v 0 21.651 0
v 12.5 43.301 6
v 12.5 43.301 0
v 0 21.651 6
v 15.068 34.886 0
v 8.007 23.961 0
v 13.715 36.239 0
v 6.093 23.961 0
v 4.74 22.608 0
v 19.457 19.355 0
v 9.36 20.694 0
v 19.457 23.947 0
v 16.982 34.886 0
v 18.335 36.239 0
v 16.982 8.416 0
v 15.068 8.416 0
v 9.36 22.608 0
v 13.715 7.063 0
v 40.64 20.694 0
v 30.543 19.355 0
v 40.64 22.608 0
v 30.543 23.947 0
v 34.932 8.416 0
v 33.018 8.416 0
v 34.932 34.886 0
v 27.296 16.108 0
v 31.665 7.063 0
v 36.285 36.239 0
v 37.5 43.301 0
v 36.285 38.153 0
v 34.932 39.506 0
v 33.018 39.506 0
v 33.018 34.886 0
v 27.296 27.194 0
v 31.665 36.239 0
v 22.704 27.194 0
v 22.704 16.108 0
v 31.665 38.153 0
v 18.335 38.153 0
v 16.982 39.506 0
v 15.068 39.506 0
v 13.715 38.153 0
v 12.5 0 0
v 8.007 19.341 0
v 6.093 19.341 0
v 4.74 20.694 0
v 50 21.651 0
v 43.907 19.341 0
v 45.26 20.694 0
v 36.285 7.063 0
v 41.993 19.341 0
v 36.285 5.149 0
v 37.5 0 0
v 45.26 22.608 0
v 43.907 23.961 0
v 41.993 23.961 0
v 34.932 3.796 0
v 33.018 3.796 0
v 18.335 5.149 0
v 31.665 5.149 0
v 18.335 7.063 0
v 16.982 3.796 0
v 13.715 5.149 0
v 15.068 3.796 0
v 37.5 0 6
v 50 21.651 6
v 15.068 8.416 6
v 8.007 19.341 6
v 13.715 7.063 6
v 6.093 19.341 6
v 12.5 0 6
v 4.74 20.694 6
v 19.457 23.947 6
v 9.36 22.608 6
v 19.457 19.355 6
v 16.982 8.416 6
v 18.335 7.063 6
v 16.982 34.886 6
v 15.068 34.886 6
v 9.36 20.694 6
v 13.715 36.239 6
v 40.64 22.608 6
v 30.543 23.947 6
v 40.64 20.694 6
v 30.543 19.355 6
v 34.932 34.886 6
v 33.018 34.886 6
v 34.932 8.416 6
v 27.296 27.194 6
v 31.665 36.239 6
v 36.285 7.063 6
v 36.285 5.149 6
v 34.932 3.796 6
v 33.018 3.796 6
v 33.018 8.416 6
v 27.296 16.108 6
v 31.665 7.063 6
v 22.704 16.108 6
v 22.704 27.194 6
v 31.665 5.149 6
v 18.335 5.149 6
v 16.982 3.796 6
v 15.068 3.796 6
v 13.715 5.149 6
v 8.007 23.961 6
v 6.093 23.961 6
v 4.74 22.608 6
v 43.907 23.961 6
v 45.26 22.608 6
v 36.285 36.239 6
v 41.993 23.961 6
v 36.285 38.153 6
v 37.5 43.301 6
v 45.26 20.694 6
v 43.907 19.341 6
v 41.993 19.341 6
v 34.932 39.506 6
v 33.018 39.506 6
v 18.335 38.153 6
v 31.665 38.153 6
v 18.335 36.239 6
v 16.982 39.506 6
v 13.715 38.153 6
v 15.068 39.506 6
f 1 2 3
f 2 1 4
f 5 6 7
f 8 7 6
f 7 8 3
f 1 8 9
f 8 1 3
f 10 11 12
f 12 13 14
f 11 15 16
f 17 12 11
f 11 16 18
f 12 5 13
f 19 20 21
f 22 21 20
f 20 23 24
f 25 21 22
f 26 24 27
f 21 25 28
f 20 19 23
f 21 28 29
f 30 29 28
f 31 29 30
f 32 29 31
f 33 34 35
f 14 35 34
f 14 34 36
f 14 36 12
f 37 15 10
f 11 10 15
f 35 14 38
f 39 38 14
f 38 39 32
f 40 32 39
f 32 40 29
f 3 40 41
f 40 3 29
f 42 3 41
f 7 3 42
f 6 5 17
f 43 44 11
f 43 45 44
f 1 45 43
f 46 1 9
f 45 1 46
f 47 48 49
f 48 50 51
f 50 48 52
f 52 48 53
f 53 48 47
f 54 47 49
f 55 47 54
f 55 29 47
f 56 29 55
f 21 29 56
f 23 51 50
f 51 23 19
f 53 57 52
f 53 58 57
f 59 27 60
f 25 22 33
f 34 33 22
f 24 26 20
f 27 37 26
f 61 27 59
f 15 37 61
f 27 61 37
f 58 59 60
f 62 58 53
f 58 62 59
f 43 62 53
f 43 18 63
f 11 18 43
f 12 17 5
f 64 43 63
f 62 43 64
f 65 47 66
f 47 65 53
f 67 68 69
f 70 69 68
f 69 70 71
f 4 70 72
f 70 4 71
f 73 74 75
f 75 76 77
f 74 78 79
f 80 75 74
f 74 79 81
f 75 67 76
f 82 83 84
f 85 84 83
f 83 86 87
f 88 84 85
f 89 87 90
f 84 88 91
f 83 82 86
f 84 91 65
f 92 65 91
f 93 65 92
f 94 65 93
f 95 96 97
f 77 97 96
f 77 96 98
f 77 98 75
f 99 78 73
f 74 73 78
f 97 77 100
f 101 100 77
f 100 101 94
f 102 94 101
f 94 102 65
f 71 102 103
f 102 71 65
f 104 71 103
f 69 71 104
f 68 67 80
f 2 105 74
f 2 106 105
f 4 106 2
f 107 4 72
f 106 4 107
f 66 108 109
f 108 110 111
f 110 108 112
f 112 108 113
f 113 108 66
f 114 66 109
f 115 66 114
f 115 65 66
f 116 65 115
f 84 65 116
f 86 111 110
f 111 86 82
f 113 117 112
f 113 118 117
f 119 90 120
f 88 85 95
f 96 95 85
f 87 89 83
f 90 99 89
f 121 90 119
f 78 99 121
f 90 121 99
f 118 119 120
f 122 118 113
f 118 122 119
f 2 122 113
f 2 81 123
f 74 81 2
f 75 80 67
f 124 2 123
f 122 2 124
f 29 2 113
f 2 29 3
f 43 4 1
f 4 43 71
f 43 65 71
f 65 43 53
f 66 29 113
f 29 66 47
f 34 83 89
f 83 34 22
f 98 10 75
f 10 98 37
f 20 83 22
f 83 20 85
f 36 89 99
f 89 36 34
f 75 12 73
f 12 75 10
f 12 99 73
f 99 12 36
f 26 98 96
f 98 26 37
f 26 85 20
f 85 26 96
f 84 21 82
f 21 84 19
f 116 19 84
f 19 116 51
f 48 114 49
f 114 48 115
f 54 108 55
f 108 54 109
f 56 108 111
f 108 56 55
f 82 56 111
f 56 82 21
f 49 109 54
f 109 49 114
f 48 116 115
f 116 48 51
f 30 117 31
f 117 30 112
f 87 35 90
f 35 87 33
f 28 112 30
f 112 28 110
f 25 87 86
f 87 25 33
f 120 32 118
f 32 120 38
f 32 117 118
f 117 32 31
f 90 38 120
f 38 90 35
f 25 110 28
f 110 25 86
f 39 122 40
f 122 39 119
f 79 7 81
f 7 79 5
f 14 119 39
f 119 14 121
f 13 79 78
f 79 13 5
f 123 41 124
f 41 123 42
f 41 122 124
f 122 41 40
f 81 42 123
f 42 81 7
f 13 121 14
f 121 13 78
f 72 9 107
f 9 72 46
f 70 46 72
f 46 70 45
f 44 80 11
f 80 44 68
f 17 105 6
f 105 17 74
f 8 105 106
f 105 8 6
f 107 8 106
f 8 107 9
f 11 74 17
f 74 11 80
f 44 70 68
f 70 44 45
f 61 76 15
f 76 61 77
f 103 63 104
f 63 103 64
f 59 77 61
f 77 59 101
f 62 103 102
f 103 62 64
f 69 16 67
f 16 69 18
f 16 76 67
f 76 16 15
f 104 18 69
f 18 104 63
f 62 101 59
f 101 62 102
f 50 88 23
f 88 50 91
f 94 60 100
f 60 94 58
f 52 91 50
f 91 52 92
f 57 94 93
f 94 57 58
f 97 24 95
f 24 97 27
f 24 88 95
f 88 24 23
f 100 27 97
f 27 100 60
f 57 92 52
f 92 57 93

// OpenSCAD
$fn = 32;

// ----------------------------------------------------------------------
// Polygon plate: 6-gon R25, 6 bolt windows
// ----------------------------------------------------------------------

// --- parameters (mm) ---
sides = 6;                // number of polygon sides
plate_r = 25;             // circumscribed radius of the polygon
bore_r = 6;               // centre bore radius
bolts = 6;                // number of bolt windows
ring_r = 17.95;           // bolt-circle radius
bolt_r = 2.5;             // bolt window radius
plate_t = 6;              // plate thickness, Z (extrusion height)

plate_d = 2 * plate_r;  // circumscribed diameter
bore_d = 2 * bore_r;  // centre bore diameter
bolt_d = 2 * bolt_r;  // bolt window diameter
ring_d = 2 * ring_r;  // bolt-circle diameter

profile = [[50, 21.651], [37.5, 43.301], [12.5, 43.301], [0, 21.651], [12.5, 0], [37.5, 0]];  // primary outline, 6 points, counter clockwise
void_1 = [[30.543, 23.947], [27.296, 27.194], [22.704, 27.194], [19.457, 23.947], [19.457, 19.355], [22.704, 16.108], [27.296, 16.108], [30.543, 19.355]];  // centre bore, 8 points
void_2 = [[45.26, 22.608], [43.907, 23.961], [41.993, 23.961], [40.64, 22.608], [40.64, 20.694], [41.993, 19.341], [43.907, 19.341], [45.26, 20.694]];  // bolt window 1, 8 points
void_3 = [[36.285, 38.153], [34.932, 39.506], [33.018, 39.506], [31.665, 38.153], [31.665, 36.239], [33.018, 34.886], [34.932, 34.886], [36.285, 36.239]];  // bolt window 2, 8 points
void_4 = [[18.335, 38.153], [16.982, 39.506], [15.068, 39.506], [13.715, 38.153], [13.715, 36.239], [15.068, 34.886], [16.982, 34.886], [18.335, 36.239]];  // bolt window 3, 8 points
void_5 = [[9.36, 22.608], [8.007, 23.961], [6.093, 23.961], [4.74, 22.608], [4.74, 20.694], [6.093, 19.341], [8.007, 19.341], [9.36, 20.694]];  // bolt window 4, 8 points
void_6 = [[18.335, 7.063], [16.982, 8.416], [15.068, 8.416], [13.715, 7.063], [13.715, 5.149], [15.068, 3.796], [16.982, 3.796], [18.335, 5.149]];  // bolt window 5, 8 points
void_7 = [[36.285, 7.063], [34.932, 8.416], [33.018, 8.416], [31.665, 7.063], [31.665, 5.149], [33.018, 3.796], [34.932, 3.796], [36.285, 5.149]];  // bolt window 6, 8 points

// --- the one profile operation ---
difference() {
  linear_extrude(height = plate_t) polygon(points = profile);
  translate([0, 0, -1])
    linear_extrude(height = plate_t + 2) polygon(points = void_1);
  translate([0, 0, -1])
    linear_extrude(height = plate_t + 2) polygon(points = void_2);
  translate([0, 0, -1])
    linear_extrude(height = plate_t + 2) polygon(points = void_3);
  translate([0, 0, -1])
    linear_extrude(height = plate_t + 2) polygon(points = void_4);
  translate([0, 0, -1])
    linear_extrude(height = plate_t + 2) polygon(points = void_5);
  translate([0, 0, -1])
    linear_extrude(height = plate_t + 2) polygon(points = void_6);
  translate([0, 0, -1])
    linear_extrude(height = plate_t + 2) polygon(points = void_7);
}
